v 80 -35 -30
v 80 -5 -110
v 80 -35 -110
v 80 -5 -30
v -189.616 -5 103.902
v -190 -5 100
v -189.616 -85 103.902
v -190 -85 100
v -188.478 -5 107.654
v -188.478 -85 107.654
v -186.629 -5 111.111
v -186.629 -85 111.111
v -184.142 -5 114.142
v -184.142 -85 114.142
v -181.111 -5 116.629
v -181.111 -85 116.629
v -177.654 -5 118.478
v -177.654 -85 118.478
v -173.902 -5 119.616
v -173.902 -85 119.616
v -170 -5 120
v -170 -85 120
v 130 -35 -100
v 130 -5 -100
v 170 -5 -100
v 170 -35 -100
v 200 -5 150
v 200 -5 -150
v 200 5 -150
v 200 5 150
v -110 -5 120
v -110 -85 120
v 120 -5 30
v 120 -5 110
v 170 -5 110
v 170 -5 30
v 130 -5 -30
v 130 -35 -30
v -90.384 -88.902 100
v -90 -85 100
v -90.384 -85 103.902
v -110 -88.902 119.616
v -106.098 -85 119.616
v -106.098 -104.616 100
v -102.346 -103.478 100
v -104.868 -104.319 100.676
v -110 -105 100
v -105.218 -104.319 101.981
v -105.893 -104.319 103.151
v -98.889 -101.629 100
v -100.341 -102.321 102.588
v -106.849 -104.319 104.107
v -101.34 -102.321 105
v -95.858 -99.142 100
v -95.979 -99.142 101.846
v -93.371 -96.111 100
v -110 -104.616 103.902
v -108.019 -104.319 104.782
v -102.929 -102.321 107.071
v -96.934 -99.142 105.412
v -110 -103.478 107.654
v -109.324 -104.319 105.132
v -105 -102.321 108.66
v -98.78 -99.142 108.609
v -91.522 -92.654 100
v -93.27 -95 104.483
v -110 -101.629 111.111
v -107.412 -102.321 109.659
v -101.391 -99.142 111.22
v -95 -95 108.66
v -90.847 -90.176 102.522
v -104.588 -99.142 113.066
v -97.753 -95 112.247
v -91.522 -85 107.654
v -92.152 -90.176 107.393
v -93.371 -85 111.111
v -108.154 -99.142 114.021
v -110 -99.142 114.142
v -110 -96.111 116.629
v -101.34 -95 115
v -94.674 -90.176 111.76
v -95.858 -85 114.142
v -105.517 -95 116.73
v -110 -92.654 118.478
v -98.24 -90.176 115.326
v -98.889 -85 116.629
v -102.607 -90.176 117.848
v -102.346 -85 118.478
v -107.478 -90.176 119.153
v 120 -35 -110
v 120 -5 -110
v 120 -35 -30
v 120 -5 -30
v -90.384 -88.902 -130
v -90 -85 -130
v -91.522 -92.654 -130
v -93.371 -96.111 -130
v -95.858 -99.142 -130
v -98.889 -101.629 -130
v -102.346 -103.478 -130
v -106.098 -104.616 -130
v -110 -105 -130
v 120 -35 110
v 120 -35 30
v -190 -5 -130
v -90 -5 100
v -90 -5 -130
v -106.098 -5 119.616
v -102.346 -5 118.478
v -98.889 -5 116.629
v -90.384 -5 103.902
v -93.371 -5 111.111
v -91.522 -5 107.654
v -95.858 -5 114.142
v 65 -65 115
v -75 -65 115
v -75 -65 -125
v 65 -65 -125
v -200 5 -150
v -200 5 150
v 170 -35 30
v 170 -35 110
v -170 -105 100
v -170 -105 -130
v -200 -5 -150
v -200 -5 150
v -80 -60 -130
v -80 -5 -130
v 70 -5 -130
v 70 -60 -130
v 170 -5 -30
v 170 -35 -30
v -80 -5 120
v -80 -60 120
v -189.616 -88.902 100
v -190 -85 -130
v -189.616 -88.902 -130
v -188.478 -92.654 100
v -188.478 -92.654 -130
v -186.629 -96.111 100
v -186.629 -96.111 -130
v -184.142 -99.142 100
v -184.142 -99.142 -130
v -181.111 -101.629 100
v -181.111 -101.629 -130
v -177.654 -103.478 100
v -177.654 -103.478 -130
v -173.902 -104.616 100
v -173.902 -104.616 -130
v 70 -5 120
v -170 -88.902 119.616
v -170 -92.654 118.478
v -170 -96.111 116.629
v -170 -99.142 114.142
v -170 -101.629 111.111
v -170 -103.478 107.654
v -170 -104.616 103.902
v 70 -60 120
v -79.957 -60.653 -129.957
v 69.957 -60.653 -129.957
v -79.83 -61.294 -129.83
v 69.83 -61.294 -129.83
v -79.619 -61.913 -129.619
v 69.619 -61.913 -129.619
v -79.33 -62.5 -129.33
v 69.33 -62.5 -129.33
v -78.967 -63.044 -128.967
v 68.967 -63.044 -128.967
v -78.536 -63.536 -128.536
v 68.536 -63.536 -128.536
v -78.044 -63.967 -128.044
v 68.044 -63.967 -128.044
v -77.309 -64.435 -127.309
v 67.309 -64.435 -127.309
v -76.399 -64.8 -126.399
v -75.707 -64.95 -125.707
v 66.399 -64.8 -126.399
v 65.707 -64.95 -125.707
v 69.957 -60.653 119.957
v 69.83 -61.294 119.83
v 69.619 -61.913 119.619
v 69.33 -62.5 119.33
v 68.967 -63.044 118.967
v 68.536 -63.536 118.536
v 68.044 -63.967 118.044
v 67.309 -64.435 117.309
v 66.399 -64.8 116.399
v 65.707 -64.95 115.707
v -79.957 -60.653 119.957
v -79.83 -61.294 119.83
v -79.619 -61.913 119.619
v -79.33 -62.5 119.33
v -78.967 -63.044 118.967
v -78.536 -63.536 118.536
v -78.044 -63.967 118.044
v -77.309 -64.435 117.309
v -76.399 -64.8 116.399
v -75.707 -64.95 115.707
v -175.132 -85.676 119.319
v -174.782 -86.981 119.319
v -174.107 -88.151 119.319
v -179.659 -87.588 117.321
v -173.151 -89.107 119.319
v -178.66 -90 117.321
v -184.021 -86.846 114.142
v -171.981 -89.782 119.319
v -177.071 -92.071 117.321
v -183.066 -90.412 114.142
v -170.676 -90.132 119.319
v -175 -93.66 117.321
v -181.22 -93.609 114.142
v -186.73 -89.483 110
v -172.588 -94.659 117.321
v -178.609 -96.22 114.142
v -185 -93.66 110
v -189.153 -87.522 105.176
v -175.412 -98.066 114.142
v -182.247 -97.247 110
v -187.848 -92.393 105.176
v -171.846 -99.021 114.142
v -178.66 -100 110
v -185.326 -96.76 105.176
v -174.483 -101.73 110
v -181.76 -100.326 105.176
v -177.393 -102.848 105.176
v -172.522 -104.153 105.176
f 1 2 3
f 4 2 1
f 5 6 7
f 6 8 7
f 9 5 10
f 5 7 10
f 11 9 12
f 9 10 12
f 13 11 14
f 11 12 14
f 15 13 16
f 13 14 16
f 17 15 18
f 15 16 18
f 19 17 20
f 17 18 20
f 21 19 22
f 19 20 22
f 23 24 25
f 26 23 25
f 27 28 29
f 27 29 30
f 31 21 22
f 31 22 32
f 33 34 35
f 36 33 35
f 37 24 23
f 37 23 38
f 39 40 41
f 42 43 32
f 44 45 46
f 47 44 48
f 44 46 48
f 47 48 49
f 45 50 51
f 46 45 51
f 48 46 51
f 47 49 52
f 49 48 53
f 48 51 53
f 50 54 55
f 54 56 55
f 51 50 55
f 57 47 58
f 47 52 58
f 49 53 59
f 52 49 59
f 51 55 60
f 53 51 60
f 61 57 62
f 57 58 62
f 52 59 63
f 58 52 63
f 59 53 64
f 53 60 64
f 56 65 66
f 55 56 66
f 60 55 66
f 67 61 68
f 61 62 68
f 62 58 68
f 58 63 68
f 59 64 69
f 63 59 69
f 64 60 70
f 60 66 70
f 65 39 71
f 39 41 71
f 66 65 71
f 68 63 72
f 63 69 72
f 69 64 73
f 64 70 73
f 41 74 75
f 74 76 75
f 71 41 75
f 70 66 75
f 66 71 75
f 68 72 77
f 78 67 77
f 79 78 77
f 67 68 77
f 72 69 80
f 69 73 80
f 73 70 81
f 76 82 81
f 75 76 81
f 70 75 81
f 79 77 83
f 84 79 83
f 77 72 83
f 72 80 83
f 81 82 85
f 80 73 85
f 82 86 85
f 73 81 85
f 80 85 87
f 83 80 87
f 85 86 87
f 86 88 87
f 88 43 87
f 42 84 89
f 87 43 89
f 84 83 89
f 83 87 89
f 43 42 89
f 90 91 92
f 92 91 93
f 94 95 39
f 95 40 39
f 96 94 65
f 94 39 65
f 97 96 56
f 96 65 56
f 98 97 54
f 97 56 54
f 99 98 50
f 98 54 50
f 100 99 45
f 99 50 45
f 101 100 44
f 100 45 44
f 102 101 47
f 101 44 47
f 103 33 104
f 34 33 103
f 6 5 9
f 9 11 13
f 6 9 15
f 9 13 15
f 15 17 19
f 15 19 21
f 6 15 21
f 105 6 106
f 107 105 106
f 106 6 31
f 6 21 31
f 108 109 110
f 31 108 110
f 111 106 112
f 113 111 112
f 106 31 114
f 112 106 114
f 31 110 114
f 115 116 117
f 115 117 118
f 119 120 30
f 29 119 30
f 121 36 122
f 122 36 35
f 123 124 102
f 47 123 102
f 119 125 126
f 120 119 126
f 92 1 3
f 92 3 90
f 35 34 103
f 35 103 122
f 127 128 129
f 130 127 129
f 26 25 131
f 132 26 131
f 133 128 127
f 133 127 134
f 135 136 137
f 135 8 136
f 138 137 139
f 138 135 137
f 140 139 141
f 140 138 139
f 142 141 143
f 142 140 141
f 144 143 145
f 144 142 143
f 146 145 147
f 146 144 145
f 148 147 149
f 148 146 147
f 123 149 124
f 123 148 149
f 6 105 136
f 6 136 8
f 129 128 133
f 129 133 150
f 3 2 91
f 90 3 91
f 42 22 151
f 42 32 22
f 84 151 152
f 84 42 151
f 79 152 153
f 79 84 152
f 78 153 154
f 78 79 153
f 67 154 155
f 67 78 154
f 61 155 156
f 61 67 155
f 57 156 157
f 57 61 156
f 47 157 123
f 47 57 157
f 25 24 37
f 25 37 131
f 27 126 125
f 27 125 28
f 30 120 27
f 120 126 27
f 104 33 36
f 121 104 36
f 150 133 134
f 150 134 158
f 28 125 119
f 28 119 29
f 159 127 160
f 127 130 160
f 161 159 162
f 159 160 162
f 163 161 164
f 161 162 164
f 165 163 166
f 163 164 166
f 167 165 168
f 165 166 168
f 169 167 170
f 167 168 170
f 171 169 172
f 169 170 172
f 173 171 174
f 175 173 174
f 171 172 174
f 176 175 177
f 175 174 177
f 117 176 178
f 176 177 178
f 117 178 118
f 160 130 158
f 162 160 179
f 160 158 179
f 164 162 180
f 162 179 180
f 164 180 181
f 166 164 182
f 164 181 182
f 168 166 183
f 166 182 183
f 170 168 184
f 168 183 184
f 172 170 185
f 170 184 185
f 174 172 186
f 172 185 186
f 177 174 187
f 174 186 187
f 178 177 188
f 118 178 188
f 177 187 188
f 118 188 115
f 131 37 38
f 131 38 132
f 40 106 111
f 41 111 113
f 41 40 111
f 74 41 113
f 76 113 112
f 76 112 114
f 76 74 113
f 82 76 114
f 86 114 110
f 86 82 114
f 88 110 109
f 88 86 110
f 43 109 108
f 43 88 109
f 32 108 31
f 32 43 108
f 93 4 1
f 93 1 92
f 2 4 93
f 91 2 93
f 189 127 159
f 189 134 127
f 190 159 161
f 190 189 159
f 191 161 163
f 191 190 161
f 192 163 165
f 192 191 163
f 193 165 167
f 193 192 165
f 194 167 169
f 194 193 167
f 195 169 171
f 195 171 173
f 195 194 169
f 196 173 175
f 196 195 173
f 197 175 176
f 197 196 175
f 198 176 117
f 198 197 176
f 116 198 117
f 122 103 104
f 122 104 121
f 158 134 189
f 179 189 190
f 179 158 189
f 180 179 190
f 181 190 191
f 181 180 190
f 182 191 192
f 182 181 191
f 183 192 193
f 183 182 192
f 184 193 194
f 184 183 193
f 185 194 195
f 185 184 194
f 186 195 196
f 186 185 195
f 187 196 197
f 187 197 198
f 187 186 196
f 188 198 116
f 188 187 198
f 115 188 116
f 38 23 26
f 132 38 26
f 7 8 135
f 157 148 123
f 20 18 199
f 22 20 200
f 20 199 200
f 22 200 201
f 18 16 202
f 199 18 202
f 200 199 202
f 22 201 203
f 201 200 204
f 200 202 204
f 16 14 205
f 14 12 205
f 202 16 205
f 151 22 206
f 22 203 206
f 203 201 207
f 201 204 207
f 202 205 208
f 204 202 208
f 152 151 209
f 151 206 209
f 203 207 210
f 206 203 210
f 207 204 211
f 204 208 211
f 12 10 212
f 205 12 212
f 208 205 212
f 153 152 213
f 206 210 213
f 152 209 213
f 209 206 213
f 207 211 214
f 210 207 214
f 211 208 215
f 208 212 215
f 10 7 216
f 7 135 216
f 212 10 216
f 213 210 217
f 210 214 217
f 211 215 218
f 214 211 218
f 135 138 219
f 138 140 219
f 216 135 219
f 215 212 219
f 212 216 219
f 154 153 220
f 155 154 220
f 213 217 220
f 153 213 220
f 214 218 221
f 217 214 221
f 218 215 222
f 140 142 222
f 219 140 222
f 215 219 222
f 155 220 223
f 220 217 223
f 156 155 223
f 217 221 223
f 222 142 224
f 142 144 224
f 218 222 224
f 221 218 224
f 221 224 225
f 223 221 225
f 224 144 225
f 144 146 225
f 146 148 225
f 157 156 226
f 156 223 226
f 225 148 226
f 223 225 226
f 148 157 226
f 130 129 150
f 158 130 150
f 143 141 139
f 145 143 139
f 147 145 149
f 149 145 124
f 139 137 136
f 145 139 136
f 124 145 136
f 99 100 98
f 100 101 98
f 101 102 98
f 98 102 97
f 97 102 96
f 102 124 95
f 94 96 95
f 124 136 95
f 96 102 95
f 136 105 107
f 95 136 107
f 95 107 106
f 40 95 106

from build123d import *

# Parameters (mm, degrees)
F0_W     = 400
F0_H     = 300
F1_DEPTH = 5
F2_W     = 100
F2_H     = 250
F3_DEPTH = 100
F2_W_2   = 150
F4_DEPTH = 60
F5_W     = 50
F5_H     = 80
F5_W_2   = 40
F5_H_2   = 70
F6_DEPTH = 30
F7_R     = 20
F8_R     = 5


with BuildPart() as f1:
    # F0 (on Front) → F1 (new body, symmetric)
    with BuildSketch(Plane.XZ):
        Rectangle(F0_W, F0_H)
    extrude(amount=F1_DEPTH, both=True)


with BuildPart() as f3:
    # F2 (on face) → F3 (new body)
    with BuildSketch(Plane.XZ.offset(5)):
        with Locations((-140, -5)):
            Rectangle(F2_W, F2_H)
    extrude(amount=F3_DEPTH)

    # F7
    f7_edges = [f3.edges().sort_by_distance(p)[0] for p in [
        (-190, -105, -5),
        (-90, -55, 120),
        (-190, -55, 120),
        (-90, -105, -5),
        (-140, -105, 120),
    ]]
    fillet(f7_edges, radius=F7_R)


with BuildPart() as f4:
    # F2 (on face) → F4 (new body)
    with BuildSketch(Plane.XZ.offset(5)):
        with Locations((-5, -5)):
            Rectangle(F2_W_2, F2_H)
    extrude(amount=F4_DEPTH)

    # F8
    f8_edges = [f4.edges().sort_by_distance(p)[0] for p in [
        (-5, -65, 120),
        (70, -65, -5),
        (-80, -65, -5),
        (-5, -65, -130),
    ]]
    fillet(f8_edges, radius=F8_R)


with BuildPart() as f6:
    # F5 (on face) → F6 (new body)
    with BuildSketch(Plane.XZ.offset(5)):
        with Locations((145, 70)):
            Rectangle(F5_W, F5_H)
        with Locations((150, -65)):
            Rectangle(F5_W_2, F5_H_2)
        with Locations((100, -70)):
            Rectangle(F5_W_2, F5_H)
    extrude(amount=F6_DEPTH)


solid = Compound([f1.part, f3.part, f4.part, f6.part])
